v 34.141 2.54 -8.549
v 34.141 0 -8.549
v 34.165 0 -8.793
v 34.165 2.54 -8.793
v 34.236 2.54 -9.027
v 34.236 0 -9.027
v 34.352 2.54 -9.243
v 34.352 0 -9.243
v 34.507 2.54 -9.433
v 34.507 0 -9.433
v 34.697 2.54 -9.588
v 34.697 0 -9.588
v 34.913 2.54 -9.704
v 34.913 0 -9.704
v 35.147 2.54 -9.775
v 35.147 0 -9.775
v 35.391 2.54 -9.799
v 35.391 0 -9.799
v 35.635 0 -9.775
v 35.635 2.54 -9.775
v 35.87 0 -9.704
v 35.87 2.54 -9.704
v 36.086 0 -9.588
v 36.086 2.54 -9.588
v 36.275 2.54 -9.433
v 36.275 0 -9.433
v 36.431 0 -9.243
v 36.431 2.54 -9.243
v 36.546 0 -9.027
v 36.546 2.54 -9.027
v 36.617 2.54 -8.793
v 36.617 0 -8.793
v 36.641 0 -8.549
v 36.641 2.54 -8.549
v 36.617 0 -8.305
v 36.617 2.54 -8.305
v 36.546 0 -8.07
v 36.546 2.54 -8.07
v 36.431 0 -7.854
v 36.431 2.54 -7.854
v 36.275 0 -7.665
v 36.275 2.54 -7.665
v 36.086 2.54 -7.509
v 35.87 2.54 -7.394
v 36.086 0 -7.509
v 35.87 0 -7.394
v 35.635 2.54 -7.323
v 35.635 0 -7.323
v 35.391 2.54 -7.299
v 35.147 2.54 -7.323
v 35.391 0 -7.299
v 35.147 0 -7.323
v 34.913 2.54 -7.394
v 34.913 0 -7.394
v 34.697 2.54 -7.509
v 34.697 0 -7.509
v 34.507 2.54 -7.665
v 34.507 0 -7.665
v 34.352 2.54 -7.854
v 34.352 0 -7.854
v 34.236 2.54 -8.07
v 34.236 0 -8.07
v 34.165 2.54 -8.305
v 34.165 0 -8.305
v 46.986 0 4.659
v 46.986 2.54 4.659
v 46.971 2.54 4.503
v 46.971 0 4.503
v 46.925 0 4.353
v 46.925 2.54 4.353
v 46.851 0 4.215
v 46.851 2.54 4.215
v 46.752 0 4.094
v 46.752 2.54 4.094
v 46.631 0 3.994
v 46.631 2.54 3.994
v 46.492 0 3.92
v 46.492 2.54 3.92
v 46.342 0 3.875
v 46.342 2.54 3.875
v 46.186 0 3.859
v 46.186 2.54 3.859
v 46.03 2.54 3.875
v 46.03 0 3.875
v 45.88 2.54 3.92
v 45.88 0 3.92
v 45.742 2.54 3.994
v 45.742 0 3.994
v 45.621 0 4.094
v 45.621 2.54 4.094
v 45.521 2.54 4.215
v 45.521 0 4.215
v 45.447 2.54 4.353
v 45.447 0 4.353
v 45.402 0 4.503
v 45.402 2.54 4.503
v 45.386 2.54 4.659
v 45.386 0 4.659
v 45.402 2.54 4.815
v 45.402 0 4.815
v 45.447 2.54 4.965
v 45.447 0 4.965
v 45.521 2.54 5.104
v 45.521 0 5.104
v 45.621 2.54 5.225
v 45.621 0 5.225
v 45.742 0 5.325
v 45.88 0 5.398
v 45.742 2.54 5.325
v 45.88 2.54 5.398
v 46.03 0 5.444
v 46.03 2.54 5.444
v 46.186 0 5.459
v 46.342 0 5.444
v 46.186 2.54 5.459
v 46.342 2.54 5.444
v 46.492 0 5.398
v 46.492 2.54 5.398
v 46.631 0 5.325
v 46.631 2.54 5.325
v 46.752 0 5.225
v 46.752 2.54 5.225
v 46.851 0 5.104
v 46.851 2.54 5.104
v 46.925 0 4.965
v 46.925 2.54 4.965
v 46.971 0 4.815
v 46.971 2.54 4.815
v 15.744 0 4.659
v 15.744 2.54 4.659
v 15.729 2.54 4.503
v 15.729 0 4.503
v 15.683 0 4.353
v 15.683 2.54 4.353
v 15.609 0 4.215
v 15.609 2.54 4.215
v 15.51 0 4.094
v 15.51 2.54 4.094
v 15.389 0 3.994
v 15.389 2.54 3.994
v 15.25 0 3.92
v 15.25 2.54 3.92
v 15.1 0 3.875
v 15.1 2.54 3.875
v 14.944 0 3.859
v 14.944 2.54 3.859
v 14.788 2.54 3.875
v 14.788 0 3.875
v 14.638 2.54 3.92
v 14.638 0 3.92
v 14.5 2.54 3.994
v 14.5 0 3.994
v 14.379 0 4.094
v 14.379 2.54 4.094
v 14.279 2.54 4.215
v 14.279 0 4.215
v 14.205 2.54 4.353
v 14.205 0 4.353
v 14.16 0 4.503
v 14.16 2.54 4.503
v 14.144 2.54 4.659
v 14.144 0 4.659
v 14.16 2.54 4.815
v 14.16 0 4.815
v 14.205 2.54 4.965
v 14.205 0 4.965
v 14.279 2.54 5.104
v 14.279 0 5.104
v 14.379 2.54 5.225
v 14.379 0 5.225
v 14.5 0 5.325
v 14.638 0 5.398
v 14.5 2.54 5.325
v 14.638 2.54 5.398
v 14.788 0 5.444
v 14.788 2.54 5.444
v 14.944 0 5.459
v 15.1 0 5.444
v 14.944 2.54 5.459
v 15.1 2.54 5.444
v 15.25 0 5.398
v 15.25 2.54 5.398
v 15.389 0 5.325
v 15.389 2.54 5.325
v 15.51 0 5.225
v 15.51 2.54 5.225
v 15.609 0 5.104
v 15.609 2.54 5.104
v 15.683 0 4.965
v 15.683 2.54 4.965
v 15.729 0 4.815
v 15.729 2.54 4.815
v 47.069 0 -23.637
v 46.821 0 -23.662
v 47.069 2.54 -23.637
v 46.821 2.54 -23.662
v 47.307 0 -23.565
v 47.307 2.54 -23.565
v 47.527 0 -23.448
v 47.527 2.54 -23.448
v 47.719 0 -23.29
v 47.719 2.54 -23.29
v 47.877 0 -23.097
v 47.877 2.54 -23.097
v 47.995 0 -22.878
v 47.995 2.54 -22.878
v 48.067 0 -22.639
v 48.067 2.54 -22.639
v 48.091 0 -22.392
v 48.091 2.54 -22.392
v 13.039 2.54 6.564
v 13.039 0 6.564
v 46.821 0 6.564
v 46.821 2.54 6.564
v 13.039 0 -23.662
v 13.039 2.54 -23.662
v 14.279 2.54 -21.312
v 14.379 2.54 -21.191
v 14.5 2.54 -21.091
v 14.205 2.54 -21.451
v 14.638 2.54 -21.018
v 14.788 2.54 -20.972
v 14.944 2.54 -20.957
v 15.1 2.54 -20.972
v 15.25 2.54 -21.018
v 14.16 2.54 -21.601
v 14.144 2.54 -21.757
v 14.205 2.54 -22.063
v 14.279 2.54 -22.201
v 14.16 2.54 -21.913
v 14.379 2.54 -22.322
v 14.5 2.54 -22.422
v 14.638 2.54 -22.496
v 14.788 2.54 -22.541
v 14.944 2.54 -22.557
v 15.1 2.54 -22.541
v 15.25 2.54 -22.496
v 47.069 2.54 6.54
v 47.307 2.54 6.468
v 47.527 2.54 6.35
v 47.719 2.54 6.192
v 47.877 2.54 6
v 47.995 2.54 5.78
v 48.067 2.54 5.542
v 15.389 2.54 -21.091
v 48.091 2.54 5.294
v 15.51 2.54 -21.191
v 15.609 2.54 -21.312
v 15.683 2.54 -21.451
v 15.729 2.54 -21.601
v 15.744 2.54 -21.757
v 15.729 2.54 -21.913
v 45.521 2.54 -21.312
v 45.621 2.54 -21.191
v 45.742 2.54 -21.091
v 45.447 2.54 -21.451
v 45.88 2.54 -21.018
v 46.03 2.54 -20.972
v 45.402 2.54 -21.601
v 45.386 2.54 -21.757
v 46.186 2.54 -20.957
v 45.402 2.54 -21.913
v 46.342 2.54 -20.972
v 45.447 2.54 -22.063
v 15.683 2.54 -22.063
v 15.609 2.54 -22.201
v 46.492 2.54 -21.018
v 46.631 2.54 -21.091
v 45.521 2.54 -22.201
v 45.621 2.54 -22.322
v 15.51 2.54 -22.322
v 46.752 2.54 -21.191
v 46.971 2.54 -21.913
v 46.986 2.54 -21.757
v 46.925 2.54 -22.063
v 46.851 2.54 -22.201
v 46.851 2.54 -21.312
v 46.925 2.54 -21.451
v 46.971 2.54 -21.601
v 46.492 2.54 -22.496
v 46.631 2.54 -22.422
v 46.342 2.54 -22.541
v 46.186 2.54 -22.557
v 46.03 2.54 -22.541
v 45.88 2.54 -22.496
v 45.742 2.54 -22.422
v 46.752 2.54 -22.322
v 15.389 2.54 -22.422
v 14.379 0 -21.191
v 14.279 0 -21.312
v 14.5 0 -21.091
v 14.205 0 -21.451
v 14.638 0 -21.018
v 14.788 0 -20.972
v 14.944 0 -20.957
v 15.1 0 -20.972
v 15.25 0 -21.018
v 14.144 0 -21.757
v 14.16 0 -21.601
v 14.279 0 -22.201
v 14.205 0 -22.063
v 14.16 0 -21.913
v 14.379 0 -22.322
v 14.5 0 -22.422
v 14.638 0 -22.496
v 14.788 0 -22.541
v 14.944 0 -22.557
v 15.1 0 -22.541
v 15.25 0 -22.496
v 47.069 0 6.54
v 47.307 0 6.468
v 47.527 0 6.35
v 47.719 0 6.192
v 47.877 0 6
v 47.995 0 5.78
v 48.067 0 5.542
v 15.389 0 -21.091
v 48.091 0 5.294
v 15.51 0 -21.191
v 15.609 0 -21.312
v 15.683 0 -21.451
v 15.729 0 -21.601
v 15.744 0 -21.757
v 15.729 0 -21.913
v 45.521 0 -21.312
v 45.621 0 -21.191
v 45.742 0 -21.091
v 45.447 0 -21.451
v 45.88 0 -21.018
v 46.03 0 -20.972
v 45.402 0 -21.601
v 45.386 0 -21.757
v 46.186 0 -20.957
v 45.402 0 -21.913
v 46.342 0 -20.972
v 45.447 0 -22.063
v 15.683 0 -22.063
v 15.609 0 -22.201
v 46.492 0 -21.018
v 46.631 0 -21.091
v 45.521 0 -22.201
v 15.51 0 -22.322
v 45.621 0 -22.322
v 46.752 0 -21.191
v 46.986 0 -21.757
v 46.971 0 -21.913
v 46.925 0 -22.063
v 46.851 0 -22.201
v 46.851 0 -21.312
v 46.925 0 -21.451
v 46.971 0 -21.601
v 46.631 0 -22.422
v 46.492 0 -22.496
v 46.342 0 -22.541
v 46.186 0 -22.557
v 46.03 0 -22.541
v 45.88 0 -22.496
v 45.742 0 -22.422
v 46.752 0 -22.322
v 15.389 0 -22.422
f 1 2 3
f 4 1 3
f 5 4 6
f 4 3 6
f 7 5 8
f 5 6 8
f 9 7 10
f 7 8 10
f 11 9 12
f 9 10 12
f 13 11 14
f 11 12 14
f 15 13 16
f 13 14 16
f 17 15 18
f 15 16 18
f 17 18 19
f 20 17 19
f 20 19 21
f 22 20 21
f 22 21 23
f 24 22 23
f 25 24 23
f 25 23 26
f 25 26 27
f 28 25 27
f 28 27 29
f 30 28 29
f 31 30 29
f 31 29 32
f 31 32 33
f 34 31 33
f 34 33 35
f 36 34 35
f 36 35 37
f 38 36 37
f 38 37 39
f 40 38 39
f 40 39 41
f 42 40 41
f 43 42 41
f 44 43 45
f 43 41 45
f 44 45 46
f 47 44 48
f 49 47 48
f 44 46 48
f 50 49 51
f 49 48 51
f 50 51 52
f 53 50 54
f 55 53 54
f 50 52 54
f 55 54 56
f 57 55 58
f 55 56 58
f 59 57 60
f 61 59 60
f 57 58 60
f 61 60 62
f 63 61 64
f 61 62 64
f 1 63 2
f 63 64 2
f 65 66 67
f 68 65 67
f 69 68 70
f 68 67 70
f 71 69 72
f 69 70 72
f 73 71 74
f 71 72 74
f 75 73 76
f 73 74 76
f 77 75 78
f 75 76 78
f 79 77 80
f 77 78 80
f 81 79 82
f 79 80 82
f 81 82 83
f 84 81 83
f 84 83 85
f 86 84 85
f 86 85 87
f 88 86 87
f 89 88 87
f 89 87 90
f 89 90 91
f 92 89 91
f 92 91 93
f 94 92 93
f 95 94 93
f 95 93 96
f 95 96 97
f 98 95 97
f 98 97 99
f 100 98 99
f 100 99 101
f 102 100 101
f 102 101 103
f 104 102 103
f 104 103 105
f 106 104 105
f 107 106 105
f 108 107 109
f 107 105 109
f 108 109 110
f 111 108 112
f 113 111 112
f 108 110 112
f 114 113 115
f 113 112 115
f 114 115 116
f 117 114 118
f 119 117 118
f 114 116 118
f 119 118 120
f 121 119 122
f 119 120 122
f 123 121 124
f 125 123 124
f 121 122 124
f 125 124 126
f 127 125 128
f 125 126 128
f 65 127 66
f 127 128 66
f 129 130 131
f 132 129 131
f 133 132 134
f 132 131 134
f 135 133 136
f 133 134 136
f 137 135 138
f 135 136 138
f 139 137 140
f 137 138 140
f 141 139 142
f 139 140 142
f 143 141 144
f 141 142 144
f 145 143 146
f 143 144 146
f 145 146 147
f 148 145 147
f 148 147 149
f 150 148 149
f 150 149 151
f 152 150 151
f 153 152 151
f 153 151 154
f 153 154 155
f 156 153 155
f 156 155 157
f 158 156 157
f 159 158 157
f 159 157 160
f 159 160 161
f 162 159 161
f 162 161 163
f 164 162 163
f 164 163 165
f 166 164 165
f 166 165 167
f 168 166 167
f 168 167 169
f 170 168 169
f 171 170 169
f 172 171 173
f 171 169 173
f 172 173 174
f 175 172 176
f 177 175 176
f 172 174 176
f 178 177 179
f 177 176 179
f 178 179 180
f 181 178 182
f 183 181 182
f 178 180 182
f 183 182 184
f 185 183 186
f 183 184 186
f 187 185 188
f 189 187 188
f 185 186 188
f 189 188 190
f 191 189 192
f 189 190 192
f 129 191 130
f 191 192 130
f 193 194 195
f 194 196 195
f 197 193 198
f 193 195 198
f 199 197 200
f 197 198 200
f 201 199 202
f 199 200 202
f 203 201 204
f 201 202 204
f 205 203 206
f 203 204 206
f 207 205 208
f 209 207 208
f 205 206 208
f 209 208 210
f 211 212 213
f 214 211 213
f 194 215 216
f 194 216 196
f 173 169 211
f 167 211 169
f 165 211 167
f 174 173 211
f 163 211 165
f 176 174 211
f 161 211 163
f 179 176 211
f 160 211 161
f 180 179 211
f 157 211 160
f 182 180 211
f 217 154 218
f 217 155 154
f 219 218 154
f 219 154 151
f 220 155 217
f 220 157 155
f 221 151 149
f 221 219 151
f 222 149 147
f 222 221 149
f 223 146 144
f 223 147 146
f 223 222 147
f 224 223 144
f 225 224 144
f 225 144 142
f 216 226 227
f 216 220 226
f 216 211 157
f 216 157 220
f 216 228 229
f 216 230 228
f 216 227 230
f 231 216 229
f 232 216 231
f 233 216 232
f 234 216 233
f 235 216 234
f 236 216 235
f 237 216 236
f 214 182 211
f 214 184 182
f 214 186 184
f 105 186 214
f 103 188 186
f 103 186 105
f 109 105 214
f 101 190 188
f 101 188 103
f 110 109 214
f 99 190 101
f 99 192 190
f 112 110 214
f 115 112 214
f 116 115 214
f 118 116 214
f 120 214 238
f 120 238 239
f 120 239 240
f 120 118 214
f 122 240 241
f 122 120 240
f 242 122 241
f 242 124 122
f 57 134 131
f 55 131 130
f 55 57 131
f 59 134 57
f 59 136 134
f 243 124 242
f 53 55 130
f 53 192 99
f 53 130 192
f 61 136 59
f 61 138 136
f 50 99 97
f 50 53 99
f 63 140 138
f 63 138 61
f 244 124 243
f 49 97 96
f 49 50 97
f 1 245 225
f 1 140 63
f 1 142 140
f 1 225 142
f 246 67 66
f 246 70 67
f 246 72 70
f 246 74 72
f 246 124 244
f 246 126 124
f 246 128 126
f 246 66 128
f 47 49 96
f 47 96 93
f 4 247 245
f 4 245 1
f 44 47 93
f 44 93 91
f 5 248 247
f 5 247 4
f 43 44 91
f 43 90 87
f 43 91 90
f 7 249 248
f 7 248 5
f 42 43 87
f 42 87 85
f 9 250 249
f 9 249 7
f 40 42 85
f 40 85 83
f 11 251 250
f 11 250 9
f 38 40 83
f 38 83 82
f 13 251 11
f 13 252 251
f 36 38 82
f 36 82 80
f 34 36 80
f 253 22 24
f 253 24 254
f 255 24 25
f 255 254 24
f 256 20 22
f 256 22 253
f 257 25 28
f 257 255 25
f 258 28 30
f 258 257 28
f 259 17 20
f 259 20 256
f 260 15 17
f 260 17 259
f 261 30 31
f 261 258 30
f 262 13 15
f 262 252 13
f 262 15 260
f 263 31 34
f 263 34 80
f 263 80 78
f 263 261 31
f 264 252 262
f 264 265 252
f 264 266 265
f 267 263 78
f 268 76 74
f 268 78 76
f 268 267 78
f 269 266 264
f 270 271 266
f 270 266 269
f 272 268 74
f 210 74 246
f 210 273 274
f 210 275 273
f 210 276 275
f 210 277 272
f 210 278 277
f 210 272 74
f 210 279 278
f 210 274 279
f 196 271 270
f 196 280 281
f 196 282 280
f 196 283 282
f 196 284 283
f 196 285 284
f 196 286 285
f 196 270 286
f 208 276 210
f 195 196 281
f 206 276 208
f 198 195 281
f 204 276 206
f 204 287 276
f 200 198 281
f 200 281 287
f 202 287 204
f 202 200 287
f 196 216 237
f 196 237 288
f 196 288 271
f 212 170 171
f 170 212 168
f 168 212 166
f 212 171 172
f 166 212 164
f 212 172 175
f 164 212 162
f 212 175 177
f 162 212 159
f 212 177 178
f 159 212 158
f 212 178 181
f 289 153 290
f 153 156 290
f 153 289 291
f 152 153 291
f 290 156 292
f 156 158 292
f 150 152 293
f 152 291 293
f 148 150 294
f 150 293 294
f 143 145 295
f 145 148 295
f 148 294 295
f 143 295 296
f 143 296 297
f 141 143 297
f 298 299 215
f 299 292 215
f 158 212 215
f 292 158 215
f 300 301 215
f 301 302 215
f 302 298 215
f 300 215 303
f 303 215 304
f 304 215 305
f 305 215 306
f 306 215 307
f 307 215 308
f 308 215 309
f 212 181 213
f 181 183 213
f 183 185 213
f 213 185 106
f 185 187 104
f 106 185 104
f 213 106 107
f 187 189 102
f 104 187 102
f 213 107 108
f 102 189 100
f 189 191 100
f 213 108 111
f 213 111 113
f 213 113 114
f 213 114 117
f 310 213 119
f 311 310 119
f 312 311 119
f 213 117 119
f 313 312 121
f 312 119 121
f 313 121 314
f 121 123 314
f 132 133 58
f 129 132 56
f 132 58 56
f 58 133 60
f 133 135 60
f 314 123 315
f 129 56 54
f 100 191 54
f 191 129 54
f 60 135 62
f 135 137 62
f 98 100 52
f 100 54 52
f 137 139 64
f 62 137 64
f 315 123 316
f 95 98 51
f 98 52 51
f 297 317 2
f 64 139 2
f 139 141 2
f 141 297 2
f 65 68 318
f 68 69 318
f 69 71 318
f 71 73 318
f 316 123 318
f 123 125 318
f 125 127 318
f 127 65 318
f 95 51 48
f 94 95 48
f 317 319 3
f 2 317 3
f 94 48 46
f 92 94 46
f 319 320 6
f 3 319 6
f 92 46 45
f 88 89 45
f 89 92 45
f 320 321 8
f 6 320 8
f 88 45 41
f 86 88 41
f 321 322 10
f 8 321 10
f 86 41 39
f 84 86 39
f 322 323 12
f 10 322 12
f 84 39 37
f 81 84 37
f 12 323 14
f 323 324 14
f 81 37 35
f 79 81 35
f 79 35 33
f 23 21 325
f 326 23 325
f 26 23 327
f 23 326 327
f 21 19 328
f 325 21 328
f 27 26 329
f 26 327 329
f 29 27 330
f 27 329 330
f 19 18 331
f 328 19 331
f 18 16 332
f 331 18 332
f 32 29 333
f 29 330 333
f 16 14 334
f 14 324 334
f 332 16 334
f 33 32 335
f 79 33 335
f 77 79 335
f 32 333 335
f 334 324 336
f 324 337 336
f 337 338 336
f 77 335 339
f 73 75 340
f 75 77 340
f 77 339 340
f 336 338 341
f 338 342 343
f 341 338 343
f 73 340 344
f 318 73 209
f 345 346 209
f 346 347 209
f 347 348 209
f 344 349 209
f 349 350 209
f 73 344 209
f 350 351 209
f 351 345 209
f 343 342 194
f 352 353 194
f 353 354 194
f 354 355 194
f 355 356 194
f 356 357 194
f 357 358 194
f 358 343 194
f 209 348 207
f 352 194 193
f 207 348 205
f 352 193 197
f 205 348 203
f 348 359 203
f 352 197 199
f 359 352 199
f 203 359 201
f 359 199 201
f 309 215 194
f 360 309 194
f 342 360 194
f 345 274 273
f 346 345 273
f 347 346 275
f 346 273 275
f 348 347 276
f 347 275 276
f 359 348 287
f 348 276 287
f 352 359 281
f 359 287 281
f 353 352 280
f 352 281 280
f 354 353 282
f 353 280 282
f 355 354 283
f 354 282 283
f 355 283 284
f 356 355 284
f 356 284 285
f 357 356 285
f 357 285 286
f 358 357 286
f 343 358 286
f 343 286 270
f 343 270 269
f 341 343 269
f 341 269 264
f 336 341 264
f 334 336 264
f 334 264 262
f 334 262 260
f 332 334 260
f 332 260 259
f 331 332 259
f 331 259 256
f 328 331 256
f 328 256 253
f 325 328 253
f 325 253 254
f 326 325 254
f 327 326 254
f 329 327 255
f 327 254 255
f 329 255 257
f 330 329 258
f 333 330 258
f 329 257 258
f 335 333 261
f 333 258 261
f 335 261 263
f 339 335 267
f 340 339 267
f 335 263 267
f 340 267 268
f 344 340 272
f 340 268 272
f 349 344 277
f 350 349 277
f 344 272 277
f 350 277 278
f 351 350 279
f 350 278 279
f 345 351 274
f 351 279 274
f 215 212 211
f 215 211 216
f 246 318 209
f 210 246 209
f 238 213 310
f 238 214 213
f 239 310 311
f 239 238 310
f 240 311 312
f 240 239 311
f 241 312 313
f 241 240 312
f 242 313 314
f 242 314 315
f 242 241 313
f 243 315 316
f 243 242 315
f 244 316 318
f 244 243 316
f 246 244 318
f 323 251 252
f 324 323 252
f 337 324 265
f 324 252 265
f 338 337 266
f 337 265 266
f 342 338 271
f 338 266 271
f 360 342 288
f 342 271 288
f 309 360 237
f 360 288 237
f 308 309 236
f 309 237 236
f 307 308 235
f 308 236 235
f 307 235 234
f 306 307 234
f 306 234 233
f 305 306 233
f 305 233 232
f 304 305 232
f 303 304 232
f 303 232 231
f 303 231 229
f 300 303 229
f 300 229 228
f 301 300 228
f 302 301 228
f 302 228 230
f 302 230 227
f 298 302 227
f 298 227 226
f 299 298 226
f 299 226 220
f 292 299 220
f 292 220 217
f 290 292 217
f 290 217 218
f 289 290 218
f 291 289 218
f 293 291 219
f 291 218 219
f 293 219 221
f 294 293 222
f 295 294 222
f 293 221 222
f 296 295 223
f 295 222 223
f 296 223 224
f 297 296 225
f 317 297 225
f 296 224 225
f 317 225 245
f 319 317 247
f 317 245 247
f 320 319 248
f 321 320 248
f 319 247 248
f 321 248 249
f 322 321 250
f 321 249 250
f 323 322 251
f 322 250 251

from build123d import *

# Parameters (mm, degrees)
SKETCH1_W                  = 35.052
SKETCH1_H                  = 30.226
BOSS_EXTRUDE1_DEPTH        = 2.54
F_1_6_1_6_DIAMETER_HOLE1_D = 1.6
F_2_5_2_5_DIAMETER_HOLE1_D = 2.5
FILLET1_R                  = 1.27


with BuildPart() as part:
    # Sketch1 → Boss-Extrude1 (new body)
    with BuildSketch(Plane(origin=(0, 0, 0), x_dir=(1, 0, 0), z_dir=(0, 1, 0))):
        with Locations((30.56522406, 8.548665099)):
            Rectangle(SKETCH1_W, SKETCH1_H)
    extrude(amount=BOSS_EXTRUDE1_DEPTH)

    # Ø1.6 (1.6) Diameter Hole1 (through all)
    with Locations(Plane(origin=(0, 0, 0), x_dir=(-1, 0, 0), z_dir=(0, -1, 0))):
        with Locations((-14.94422406, -4.659334901), (-46.18622406, -4.659334901), (-46.18622406, 21.756665099), (-14.94422406, 21.756665099)):
            Hole(F_1_6_1_6_DIAMETER_HOLE1_D / 2)

    # Ø2.5 (2.5) Diameter Hole1 (through all)
    with Locations(Plane(origin=(0, 2.54, 0), x_dir=(1, 0, 0), z_dir=(0, 1, 0))):
        with Locations((35.39122406, 8.548665099)):
            Hole(F_2_5_2_5_DIAMETER_HOLE1_D / 2)

    # Fillet1
    fillet1_edges = [part.edges().sort_by_distance(p)[0] for p in [
        (48.09122406, 1.27, -23.661665099),
        (48.09122406, 1.27, 6.564334901),
    ]]
    fillet(fillet1_edges, radius=FILLET1_R)


solid = part.part
